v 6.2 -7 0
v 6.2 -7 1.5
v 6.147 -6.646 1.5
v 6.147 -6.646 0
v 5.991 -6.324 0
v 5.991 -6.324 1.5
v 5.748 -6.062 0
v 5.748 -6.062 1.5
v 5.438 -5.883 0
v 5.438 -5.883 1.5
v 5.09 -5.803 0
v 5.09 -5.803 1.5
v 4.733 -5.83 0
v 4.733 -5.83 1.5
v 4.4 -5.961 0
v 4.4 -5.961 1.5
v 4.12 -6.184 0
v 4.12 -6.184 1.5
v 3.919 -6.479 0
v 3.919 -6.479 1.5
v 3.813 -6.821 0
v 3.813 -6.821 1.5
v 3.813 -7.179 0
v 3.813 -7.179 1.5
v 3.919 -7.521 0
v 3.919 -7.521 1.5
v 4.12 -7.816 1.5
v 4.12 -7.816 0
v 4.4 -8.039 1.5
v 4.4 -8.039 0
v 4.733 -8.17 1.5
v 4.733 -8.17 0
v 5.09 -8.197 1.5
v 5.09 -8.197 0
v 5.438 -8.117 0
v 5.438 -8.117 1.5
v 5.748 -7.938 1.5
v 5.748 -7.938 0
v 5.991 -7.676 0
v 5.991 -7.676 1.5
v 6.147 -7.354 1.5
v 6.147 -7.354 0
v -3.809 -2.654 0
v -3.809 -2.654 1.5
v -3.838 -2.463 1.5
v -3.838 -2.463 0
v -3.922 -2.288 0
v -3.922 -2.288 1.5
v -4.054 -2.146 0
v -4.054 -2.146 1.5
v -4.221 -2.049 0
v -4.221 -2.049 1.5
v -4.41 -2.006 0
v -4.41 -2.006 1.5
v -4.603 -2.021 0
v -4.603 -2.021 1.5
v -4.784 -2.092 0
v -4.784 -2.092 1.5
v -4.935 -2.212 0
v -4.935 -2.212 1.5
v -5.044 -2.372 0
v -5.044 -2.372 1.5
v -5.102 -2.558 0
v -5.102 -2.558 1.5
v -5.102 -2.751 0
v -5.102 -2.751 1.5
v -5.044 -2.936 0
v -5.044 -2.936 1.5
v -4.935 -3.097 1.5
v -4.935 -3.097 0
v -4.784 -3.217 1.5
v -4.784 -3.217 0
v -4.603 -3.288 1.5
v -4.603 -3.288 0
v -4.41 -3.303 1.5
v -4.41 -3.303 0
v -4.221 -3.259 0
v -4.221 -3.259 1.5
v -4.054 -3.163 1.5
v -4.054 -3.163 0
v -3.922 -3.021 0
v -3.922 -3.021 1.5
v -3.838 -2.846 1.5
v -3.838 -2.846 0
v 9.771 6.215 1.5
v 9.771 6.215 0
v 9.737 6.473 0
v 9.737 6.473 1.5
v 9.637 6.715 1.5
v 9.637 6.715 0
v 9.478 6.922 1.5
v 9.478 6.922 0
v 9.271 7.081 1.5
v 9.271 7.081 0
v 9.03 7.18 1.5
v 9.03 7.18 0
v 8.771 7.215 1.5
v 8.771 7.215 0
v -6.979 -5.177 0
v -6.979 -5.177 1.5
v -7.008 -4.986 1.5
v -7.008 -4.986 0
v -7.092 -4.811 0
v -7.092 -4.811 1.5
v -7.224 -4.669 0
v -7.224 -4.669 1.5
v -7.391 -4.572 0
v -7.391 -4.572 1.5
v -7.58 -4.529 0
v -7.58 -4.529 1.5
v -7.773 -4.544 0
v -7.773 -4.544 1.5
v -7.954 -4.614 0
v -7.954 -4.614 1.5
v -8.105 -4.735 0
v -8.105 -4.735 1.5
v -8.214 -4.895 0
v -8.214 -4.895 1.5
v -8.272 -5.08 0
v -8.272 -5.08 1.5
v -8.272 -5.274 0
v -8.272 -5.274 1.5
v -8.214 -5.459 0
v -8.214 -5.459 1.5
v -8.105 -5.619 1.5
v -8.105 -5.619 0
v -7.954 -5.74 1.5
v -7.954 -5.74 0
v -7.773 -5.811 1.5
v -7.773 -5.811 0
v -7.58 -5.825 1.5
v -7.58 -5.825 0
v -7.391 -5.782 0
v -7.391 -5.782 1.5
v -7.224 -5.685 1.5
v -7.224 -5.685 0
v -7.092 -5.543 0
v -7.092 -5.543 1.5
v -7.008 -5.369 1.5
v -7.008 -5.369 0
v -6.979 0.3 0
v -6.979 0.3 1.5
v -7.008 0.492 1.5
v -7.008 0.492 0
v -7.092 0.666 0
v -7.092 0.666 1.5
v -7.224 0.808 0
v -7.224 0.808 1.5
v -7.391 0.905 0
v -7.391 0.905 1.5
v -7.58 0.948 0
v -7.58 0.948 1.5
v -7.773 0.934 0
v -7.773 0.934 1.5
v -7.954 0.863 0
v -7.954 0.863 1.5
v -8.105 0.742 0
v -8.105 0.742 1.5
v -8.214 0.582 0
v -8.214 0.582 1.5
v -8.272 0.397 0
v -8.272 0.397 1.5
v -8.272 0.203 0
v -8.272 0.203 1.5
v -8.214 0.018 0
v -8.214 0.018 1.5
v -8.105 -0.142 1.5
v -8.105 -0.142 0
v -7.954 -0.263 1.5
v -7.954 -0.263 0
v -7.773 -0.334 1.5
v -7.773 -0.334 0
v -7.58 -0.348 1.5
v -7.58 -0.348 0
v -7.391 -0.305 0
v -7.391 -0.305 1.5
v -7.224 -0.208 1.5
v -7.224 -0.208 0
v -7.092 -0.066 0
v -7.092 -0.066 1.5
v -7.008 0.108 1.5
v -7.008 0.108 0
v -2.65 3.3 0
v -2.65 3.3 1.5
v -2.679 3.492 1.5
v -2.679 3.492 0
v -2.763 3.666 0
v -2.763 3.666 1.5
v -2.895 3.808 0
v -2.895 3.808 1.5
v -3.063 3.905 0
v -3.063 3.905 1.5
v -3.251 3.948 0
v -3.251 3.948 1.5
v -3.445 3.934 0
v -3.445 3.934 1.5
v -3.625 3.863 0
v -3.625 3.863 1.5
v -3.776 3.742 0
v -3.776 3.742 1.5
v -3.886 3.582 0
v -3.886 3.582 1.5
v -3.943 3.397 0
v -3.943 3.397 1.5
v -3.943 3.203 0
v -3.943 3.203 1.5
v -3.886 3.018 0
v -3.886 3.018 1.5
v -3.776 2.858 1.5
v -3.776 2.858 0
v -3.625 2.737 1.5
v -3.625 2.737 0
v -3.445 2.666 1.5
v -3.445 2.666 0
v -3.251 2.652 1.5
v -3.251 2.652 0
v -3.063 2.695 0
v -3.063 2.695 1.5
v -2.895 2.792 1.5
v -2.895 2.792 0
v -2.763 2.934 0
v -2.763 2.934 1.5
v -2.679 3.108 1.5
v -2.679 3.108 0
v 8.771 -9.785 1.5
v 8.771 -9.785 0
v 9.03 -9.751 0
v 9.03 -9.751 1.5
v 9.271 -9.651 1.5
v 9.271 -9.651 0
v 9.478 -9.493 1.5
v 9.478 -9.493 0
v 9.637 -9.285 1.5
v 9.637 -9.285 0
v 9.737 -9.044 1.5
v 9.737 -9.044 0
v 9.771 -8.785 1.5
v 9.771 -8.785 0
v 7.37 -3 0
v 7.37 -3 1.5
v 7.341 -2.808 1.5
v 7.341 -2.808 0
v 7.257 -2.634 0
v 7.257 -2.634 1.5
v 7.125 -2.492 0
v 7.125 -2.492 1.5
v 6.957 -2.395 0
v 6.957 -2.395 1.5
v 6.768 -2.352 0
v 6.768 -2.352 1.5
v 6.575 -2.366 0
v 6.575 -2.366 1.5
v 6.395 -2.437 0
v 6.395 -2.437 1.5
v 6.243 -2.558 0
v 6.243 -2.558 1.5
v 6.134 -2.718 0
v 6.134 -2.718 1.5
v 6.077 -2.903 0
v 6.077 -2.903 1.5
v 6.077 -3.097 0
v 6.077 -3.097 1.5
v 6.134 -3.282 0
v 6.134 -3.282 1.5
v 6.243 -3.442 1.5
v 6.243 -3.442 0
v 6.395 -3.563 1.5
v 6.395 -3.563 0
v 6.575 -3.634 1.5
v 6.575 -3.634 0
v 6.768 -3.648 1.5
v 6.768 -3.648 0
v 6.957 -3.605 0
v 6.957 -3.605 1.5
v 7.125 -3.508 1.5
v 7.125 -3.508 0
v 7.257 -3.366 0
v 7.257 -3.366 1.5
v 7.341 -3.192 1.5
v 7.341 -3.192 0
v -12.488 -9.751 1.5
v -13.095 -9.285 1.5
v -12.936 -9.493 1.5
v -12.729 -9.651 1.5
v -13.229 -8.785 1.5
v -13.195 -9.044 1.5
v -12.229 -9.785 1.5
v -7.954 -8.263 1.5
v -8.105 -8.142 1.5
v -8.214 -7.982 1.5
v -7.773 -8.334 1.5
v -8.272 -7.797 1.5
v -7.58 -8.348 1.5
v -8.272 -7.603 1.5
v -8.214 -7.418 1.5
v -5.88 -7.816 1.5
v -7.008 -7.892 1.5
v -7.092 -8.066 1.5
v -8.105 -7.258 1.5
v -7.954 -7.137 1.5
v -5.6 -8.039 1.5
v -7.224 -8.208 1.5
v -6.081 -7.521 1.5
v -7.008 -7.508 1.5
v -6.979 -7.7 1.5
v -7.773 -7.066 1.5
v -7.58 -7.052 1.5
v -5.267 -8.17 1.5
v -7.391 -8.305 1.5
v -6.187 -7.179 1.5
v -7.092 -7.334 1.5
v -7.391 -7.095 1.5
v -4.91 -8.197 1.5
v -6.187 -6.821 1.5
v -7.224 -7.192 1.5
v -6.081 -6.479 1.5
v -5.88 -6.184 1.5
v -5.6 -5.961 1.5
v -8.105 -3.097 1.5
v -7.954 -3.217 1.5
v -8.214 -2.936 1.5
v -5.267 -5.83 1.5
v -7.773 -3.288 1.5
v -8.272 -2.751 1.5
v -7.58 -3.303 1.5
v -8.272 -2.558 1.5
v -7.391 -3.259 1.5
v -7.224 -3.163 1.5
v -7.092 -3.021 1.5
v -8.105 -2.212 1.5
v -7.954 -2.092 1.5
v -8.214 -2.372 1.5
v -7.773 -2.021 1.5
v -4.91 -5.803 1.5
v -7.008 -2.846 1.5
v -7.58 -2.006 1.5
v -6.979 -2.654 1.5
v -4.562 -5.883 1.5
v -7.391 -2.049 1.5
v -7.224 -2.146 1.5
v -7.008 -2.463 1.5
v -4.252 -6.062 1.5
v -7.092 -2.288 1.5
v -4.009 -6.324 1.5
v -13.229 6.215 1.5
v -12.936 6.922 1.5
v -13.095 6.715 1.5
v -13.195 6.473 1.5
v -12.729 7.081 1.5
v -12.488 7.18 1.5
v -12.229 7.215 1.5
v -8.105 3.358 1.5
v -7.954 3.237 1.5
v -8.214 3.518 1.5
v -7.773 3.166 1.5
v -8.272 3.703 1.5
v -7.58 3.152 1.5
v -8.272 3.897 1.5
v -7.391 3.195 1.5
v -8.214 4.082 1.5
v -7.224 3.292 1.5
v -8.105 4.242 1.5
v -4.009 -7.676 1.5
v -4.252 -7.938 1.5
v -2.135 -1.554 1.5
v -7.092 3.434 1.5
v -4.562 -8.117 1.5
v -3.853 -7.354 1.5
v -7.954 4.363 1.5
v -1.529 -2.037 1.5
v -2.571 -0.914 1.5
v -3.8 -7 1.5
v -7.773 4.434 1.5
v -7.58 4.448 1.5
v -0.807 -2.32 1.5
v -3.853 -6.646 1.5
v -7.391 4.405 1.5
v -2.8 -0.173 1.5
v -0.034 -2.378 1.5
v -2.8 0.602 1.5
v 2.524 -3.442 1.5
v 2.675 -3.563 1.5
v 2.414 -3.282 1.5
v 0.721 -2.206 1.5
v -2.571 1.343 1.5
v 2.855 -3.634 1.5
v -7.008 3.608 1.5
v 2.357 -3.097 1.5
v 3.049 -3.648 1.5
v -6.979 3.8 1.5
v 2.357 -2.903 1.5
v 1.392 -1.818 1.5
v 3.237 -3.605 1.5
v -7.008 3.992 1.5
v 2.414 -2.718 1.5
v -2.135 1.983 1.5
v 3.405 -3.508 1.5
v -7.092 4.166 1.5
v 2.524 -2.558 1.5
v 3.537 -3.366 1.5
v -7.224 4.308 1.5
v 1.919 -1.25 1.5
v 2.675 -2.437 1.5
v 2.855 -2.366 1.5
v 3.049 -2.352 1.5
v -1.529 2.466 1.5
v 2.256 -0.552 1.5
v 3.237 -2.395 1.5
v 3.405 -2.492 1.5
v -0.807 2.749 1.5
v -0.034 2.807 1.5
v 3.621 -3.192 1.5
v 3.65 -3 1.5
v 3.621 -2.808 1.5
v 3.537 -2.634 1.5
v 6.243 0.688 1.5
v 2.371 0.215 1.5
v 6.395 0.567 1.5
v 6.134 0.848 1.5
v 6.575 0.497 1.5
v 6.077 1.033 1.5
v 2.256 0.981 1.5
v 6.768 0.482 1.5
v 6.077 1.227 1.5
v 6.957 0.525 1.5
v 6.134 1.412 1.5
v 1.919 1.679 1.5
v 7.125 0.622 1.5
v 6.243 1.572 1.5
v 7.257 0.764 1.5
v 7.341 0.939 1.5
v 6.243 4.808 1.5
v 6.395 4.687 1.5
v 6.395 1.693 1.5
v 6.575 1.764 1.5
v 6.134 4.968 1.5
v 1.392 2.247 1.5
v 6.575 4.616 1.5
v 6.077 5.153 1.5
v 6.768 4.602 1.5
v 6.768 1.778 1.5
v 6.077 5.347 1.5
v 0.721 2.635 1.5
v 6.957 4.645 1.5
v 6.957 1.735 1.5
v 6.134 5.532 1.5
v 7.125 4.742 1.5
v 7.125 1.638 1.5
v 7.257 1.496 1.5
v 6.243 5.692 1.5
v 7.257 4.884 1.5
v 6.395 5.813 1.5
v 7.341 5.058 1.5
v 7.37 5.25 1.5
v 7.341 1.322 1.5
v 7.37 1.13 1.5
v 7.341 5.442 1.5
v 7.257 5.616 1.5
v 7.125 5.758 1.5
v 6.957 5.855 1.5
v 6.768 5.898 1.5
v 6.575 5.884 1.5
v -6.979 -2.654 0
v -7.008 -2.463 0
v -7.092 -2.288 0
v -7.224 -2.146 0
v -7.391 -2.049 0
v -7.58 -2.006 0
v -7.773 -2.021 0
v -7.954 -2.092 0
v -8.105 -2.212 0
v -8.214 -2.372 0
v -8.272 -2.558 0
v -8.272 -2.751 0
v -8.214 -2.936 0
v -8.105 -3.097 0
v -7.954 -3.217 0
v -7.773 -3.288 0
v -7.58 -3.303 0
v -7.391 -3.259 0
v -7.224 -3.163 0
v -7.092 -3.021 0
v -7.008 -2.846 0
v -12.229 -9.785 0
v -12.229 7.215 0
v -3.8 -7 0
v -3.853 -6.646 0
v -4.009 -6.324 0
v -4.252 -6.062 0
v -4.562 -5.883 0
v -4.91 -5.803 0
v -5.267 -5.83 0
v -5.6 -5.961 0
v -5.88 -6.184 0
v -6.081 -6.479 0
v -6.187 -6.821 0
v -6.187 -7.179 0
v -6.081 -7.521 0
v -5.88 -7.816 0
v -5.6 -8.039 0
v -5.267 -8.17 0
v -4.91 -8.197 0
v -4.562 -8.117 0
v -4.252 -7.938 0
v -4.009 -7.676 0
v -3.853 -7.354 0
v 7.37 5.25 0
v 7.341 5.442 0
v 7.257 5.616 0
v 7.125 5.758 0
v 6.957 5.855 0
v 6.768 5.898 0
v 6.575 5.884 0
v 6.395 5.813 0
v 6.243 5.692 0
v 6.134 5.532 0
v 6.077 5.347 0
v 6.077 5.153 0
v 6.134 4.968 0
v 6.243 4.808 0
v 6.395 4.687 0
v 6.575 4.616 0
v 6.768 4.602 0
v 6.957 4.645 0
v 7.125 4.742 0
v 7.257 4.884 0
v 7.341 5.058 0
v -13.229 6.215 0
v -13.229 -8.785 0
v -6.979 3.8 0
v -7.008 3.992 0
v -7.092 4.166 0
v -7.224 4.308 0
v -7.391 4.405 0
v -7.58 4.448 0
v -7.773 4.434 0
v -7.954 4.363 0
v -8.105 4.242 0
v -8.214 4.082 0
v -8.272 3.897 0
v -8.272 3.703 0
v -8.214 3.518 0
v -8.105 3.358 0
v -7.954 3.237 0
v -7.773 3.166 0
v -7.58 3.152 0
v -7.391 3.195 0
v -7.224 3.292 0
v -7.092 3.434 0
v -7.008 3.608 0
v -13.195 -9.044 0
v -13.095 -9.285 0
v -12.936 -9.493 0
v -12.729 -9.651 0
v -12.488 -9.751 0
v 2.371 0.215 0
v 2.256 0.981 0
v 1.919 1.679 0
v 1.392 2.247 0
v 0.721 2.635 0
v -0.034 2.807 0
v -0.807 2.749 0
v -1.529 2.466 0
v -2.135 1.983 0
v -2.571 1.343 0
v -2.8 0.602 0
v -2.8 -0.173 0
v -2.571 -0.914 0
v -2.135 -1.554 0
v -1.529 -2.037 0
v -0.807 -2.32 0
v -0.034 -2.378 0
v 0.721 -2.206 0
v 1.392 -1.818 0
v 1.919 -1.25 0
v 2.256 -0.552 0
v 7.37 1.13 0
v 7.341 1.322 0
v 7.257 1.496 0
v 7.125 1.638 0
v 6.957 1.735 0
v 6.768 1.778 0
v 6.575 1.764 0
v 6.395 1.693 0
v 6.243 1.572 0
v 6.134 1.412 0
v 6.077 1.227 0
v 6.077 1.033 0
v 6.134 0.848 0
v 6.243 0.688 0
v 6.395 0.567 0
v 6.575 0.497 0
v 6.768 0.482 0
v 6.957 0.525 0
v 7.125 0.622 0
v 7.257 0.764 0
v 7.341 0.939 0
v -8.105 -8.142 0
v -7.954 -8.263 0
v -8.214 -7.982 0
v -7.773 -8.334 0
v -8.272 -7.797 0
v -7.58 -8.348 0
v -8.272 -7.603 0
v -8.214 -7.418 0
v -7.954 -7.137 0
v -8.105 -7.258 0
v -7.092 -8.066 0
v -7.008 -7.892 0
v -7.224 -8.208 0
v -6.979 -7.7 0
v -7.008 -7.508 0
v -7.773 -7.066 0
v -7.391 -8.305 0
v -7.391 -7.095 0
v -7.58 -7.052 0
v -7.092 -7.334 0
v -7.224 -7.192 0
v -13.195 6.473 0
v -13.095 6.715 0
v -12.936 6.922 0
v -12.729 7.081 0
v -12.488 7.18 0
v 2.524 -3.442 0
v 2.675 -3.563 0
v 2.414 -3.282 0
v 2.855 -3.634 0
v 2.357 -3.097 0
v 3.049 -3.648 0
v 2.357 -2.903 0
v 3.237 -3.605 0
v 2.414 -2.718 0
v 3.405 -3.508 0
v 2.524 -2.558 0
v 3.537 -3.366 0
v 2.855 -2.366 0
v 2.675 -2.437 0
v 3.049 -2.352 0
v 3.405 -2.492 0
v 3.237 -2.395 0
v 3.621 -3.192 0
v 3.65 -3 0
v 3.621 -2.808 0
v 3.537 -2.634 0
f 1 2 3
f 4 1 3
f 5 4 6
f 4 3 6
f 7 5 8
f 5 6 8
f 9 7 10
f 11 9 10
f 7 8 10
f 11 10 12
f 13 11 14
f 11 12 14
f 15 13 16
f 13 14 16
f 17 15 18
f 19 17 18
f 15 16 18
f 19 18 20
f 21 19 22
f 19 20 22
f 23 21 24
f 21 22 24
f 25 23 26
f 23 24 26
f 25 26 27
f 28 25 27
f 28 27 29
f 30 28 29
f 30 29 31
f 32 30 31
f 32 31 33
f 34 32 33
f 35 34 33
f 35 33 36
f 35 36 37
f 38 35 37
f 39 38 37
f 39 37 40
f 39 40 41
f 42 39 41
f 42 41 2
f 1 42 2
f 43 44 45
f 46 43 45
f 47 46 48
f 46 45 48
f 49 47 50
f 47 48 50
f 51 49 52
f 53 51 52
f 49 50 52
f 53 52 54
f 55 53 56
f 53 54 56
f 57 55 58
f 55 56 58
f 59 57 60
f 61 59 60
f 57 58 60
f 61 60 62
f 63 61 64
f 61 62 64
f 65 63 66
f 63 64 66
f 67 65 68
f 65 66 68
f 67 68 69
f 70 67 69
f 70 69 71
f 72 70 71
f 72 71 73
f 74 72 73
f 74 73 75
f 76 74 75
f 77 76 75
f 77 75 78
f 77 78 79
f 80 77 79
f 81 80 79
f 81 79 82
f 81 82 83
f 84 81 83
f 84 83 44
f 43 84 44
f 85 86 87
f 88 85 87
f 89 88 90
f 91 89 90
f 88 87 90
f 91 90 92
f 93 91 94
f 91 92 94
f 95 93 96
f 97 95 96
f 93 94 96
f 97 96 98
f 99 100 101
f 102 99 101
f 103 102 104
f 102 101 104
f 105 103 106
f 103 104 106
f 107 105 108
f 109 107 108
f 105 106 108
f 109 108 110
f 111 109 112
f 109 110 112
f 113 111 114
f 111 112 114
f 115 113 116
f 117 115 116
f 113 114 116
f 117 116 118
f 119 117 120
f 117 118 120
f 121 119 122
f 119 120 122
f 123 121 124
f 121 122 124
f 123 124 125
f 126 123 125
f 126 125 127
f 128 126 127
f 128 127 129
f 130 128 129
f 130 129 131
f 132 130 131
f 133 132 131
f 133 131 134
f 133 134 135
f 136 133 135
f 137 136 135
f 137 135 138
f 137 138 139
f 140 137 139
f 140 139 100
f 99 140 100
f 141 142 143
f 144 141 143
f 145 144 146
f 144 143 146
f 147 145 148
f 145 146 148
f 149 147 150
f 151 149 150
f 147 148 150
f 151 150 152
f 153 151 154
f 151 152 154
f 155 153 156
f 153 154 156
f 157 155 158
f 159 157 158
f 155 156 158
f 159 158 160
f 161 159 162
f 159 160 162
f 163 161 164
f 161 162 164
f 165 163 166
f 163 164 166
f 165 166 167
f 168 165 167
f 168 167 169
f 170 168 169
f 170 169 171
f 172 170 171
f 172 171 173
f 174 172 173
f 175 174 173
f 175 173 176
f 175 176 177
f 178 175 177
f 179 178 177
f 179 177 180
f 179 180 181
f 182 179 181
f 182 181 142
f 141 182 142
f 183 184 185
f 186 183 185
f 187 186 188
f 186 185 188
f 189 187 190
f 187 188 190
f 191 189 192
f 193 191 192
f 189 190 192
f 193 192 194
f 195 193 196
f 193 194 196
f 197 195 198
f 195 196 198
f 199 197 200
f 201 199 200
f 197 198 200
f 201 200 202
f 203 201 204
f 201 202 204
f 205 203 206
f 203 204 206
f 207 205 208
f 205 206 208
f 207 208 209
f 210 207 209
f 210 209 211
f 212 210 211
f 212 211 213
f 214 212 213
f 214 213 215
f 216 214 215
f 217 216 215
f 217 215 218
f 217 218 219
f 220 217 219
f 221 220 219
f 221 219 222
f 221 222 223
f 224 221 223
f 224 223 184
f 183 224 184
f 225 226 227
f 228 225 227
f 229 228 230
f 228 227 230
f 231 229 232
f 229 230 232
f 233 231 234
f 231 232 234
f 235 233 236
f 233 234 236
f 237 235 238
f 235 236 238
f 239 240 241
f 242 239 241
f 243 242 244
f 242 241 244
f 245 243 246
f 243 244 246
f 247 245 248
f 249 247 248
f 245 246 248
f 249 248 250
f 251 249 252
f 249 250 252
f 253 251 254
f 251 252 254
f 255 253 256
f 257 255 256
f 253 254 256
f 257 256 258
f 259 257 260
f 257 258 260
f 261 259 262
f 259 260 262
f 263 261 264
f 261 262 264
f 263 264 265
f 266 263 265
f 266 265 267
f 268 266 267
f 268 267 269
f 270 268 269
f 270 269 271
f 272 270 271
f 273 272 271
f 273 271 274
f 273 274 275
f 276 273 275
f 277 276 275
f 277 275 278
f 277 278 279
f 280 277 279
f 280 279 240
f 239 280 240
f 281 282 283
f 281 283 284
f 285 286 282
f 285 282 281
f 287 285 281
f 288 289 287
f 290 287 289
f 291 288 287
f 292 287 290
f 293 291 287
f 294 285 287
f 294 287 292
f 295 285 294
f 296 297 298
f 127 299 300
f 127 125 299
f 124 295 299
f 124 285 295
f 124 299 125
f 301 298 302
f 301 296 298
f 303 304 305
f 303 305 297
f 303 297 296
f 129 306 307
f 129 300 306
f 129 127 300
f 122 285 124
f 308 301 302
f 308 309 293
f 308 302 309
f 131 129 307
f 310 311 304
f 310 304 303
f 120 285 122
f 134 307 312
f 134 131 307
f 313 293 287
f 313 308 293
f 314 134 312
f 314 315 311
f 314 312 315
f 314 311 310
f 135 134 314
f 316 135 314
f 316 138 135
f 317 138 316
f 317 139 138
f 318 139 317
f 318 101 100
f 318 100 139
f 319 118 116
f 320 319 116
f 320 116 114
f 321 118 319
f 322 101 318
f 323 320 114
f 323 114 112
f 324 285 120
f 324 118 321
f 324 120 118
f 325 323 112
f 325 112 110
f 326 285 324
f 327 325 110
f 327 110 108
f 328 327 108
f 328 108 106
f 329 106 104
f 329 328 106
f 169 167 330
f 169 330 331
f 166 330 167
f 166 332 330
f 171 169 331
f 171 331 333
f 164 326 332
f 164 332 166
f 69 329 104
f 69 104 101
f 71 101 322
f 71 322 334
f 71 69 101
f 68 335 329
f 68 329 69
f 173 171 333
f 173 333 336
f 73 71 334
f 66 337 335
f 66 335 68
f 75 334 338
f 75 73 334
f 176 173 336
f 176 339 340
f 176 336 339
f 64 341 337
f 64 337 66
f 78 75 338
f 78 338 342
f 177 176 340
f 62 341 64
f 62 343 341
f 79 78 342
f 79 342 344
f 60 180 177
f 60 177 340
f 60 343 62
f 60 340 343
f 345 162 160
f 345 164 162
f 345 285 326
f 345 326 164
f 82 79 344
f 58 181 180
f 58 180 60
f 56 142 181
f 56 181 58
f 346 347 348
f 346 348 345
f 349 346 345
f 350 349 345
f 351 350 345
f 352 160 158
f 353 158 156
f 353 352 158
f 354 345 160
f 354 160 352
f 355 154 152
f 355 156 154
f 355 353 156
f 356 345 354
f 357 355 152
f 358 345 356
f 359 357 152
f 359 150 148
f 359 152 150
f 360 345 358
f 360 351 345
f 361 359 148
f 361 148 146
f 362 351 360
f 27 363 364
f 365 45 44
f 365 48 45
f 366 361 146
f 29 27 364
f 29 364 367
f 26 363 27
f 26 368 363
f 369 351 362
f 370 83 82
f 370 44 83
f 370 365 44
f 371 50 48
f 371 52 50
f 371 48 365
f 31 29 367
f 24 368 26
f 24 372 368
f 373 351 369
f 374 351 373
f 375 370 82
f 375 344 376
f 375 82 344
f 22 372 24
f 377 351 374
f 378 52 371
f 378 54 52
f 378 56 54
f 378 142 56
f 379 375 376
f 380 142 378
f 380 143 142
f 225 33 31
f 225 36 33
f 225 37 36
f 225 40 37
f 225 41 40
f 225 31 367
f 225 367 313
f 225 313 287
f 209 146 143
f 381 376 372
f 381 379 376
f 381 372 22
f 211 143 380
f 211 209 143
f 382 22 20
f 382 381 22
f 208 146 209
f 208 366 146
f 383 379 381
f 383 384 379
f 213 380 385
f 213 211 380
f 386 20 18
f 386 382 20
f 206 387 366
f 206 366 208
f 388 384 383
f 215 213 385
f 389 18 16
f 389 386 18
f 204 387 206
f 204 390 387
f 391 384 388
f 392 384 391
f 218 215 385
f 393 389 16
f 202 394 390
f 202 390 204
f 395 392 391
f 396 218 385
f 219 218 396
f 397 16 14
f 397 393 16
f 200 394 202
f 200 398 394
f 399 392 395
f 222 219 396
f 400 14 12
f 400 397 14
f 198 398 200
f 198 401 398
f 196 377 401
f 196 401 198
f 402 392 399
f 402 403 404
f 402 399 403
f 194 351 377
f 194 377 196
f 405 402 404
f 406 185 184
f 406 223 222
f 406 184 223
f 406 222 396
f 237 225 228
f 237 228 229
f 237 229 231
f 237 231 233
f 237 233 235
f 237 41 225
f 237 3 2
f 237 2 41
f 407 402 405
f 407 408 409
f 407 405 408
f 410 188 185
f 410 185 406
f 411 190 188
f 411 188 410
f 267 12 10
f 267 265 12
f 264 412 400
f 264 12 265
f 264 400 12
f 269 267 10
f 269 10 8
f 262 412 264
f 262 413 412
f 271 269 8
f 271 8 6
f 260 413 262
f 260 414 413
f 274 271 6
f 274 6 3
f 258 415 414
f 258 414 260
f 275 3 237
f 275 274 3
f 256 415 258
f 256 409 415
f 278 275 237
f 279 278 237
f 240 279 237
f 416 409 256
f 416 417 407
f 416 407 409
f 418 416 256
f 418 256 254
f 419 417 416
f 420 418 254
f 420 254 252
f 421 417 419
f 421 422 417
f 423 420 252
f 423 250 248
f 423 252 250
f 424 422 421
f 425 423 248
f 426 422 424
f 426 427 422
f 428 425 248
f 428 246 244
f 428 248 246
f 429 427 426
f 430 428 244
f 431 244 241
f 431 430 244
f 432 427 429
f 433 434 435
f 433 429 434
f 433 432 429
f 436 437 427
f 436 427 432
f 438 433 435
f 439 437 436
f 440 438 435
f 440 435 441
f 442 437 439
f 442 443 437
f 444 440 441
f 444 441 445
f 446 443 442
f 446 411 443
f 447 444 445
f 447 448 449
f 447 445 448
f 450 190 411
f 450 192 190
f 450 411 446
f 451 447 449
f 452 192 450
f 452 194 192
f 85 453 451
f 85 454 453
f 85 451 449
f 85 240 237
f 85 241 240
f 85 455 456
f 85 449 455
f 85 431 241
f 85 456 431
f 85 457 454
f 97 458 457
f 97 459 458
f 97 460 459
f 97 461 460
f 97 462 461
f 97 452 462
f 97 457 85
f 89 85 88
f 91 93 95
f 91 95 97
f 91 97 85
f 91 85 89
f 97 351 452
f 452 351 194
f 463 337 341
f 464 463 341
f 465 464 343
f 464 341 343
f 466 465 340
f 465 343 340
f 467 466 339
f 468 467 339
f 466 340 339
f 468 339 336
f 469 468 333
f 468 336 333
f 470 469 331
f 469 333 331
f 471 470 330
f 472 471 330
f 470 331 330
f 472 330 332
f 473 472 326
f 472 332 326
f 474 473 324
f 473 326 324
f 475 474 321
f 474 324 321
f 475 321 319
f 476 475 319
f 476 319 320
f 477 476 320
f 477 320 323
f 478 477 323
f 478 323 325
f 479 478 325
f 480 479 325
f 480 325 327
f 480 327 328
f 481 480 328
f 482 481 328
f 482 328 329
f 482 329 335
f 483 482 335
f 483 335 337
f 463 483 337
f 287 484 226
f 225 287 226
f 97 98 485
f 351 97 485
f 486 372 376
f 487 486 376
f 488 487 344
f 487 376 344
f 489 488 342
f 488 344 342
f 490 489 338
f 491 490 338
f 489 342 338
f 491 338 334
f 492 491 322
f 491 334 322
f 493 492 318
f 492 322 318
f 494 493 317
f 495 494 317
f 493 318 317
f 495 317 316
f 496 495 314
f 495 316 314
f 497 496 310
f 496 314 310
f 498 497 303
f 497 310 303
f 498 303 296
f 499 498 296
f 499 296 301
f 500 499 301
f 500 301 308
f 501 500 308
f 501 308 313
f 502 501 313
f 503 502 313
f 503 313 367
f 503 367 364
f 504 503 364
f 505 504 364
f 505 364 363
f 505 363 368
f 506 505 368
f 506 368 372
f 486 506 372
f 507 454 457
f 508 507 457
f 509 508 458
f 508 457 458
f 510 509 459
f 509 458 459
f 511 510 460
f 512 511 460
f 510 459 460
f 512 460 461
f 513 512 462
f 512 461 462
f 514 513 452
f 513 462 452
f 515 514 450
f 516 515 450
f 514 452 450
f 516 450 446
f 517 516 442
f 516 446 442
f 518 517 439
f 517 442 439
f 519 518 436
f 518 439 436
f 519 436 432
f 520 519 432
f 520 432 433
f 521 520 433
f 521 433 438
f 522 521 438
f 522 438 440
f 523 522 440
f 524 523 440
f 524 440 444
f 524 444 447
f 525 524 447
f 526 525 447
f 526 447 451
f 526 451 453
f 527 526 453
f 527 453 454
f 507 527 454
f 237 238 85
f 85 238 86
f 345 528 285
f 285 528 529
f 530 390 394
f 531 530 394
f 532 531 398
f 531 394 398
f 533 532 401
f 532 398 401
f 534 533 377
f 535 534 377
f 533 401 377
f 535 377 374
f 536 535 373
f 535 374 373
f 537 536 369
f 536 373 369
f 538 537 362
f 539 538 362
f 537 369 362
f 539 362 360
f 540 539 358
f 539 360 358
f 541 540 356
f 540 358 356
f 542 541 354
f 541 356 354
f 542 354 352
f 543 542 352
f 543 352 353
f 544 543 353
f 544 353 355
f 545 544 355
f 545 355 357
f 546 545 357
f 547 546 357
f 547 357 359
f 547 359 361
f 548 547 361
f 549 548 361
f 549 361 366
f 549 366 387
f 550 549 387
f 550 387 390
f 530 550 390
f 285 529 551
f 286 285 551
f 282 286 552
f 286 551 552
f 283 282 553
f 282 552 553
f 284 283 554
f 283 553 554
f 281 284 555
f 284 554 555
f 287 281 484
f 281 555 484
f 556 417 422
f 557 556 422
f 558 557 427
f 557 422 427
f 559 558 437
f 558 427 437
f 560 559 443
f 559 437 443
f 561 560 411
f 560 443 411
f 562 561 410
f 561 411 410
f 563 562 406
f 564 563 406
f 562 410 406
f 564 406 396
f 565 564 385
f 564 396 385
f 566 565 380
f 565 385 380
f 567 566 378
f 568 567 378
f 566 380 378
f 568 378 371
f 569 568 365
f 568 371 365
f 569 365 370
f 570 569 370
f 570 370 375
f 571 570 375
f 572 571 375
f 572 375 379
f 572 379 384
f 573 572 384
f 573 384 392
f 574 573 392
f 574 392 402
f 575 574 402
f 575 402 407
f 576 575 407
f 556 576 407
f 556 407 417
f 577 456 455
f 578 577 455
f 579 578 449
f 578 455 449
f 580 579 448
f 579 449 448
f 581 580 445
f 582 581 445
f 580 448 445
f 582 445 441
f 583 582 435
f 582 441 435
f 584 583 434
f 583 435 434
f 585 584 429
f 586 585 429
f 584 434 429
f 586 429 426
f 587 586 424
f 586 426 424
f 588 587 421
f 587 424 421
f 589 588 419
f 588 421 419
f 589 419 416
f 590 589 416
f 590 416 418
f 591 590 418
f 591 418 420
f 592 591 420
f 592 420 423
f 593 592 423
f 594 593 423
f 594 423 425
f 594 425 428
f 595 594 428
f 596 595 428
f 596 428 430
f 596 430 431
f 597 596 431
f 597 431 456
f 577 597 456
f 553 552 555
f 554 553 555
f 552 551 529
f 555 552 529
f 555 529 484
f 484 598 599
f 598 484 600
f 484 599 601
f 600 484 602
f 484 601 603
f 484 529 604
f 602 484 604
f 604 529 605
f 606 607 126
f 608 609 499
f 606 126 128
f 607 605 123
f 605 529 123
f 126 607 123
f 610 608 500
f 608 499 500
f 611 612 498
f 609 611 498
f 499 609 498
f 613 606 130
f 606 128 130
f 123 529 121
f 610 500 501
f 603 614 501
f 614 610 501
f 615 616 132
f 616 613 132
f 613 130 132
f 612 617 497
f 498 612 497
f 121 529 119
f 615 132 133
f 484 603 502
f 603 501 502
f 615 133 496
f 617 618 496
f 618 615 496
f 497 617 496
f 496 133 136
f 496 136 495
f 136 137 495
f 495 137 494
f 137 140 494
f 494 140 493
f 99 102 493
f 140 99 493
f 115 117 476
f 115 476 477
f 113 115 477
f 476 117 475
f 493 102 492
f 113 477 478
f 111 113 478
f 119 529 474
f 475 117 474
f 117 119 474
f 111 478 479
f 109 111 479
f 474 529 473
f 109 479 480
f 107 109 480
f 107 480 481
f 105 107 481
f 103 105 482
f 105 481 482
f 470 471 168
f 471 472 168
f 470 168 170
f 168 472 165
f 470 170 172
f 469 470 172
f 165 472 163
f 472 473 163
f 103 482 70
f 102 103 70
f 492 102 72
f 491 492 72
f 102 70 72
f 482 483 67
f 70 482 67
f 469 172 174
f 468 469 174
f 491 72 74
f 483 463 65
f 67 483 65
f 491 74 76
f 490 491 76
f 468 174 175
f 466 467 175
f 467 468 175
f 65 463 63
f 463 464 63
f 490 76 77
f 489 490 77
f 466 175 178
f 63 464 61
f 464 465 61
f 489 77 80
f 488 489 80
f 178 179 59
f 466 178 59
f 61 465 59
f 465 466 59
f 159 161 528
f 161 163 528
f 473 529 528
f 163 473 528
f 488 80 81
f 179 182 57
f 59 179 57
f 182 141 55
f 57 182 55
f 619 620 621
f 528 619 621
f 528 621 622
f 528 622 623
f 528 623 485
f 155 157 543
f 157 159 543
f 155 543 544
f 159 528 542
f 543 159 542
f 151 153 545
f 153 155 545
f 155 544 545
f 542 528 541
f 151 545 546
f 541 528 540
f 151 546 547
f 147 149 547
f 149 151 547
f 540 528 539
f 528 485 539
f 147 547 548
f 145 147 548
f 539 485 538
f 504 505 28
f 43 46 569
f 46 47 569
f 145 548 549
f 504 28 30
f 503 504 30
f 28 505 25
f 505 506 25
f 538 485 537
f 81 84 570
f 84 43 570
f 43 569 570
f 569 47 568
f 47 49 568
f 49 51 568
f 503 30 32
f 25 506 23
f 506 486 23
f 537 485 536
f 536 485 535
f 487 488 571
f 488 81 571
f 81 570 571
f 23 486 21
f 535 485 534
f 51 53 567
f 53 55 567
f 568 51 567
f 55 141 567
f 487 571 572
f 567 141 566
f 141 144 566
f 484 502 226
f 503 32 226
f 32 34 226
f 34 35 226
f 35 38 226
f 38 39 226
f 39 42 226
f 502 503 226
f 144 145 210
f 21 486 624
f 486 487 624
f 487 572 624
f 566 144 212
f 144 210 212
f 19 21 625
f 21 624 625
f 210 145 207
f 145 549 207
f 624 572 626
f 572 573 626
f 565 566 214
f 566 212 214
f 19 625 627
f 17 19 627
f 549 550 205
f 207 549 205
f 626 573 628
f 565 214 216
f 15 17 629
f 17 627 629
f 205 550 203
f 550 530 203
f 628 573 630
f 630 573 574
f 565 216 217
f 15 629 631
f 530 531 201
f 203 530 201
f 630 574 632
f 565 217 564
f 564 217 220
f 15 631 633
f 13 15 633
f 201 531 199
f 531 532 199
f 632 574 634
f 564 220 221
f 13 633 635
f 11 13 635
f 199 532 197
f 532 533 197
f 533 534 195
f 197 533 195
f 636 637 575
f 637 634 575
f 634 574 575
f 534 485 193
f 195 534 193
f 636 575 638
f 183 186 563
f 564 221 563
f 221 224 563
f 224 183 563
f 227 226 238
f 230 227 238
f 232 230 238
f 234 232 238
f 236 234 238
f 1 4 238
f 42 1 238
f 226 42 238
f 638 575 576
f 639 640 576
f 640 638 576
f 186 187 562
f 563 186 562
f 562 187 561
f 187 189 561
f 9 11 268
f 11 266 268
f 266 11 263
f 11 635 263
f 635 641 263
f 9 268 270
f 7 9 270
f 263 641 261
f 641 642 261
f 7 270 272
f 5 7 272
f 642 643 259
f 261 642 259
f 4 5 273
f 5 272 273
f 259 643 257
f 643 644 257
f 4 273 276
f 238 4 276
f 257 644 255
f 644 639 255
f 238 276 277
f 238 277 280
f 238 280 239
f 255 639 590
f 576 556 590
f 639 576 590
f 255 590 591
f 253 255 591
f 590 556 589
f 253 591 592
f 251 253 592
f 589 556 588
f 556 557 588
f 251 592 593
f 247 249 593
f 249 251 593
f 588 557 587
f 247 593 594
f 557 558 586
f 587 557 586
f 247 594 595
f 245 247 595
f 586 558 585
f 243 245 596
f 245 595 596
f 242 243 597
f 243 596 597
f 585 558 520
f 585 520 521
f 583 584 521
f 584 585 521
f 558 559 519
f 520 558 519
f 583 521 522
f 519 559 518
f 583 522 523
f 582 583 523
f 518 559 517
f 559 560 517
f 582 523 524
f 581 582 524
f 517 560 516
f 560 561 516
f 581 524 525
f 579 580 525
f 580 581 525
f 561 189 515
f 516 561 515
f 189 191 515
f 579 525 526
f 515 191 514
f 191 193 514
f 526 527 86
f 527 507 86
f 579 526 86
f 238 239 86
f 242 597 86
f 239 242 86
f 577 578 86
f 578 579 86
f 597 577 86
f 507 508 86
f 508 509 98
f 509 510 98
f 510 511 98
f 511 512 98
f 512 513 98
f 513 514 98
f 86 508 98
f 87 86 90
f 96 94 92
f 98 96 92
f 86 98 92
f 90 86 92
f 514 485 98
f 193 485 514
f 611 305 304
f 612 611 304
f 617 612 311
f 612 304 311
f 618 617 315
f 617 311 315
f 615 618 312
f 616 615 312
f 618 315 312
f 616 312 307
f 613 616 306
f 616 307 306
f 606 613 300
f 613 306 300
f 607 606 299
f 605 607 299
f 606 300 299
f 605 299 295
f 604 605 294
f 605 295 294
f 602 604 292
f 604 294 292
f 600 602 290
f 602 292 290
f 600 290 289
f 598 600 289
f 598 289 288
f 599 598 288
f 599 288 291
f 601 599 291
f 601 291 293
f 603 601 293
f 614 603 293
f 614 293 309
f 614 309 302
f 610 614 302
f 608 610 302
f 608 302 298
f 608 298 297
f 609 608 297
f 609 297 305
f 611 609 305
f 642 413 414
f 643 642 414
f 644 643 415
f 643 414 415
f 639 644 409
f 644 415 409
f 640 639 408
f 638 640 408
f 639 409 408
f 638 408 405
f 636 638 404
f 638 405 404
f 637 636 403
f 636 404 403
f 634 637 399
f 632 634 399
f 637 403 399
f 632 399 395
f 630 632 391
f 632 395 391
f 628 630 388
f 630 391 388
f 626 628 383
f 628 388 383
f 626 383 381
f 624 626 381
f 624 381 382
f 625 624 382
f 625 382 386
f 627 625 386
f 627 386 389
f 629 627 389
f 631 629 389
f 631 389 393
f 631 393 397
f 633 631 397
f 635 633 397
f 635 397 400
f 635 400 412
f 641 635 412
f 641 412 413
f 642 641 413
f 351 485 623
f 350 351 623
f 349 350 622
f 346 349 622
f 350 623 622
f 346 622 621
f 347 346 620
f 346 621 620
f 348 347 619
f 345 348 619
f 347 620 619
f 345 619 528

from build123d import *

# Parameters (mm, degrees)
F1_DEPTH  = 1.5
F3_R      = 1.2
F4_DEPTH  = 4
F5_R      = 0.65
F6_DEPTH  = 25
F7_R      = 0.65
F8_DEPTH  = 25
F9_R      = 0.65
F10_DEPTH = 25
F12_DEPTH = 25
F2_R      = 2.6
F13_DEPTH = 25
F11_R     = 0.65
F14_DEPTH = 25


with BuildPart() as f1:
    # F0 (on Top) → F1 (new body)
    with BuildSketch(Plane.XY):
        with BuildLine():
            Line((8.771231, 7.214553), (-12.228769, 7.214553))
            ThreePointArc((-12.228769, 7.214553), (-12.935876, 6.92166), (-13.228769, 6.214553))
            Line((-13.228769, 6.214553), (-13.228769, -8.785447))
            ThreePointArc((-13.228769, -8.785447), (-12.935876, -9.492553), (-12.228769, -9.785447))
            Line((-12.228769, -9.785447), (8.771231, -9.785447))
            ThreePointArc((8.771231, -9.785447), (9.478338, -9.492553), (9.771231, -8.785447))
            Line((9.771231, -8.785447), (9.771231, 6.214553))
            ThreePointArc((9.771231, 6.214553), (9.478338, 6.92166), (8.771231, 7.214553))
        make_face()
    extrude(amount=F1_DEPTH)

    # F3 (on face) → F4 (cut)
    with BuildSketch(Plane.XY.offset(1.5)):
        with Locations((-5, -7)):
            Circle(F3_R)
        with Locations((5, -7)):
            Circle(F3_R)
    extrude(amount=-F4_DEPTH, mode=Mode.SUBTRACT)

    # F5 (on face) → F6 (cut)
    with BuildSketch(Plane.XY.offset(1.5)):
        with Locations((-7.628769, -7.7)):
            Circle(F5_R)
        with Locations((-7.628769, -5.177216)):
            Circle(F5_R)
        with Locations((-7.628769, -2.654431)):
            Circle(F5_R)
        with Locations((-4.458791, -2.654431)):
            Circle(F5_R)
    extrude(amount=-F6_DEPTH, mode=Mode.SUBTRACT)

    # F7 (on face) → F8 (cut)
    with BuildSketch(Plane.XY.offset(1.5)):
        with Locations((6.719702, 5.25)):
            Circle(F7_R)
        with Locations((6.719702, 1.130296)):
            Circle(F7_R)
        with Locations((6.719702, -3)):
            Circle(F7_R)
    extrude(amount=-F8_DEPTH, mode=Mode.SUBTRACT)

    # F9 (on face) → F10 (cut)
    with BuildSketch(Plane.XY.offset(1.5)):
        with Locations((-7.628769, 3.8)):
            Circle(F9_R)
        with Locations((-7.628769, 0.3)):
            Circle(F9_R)
    extrude(amount=-F10_DEPTH, mode=Mode.SUBTRACT)

    # F3 (on face) → F12 (cut)
    with BuildSketch(Plane.XY.offset(1.5)):
        with Locations((-5, -7)):
            Circle(F3_R)
        with Locations((5, -7)):
            Circle(F3_R)
    extrude(amount=-F12_DEPTH, mode=Mode.SUBTRACT)

    # F2 (on face) → F13 (cut)
    with BuildSketch(Plane.XY.offset(1.5)):
        with Locations((-0.228769, 0.214553)):
            Circle(F2_R)
    extrude(amount=-F13_DEPTH, mode=Mode.SUBTRACT)

    # F11 (on face) → F14 (cut)
    with BuildSketch(Plane.XY.offset(1.5)):
        with Locations((3, -3)):
            Circle(F11_R)
        with Locations((-3.3, 3.3)):
            Circle(F11_R)
    extrude(amount=-F14_DEPTH, mode=Mode.SUBTRACT)


solid = f1.part
